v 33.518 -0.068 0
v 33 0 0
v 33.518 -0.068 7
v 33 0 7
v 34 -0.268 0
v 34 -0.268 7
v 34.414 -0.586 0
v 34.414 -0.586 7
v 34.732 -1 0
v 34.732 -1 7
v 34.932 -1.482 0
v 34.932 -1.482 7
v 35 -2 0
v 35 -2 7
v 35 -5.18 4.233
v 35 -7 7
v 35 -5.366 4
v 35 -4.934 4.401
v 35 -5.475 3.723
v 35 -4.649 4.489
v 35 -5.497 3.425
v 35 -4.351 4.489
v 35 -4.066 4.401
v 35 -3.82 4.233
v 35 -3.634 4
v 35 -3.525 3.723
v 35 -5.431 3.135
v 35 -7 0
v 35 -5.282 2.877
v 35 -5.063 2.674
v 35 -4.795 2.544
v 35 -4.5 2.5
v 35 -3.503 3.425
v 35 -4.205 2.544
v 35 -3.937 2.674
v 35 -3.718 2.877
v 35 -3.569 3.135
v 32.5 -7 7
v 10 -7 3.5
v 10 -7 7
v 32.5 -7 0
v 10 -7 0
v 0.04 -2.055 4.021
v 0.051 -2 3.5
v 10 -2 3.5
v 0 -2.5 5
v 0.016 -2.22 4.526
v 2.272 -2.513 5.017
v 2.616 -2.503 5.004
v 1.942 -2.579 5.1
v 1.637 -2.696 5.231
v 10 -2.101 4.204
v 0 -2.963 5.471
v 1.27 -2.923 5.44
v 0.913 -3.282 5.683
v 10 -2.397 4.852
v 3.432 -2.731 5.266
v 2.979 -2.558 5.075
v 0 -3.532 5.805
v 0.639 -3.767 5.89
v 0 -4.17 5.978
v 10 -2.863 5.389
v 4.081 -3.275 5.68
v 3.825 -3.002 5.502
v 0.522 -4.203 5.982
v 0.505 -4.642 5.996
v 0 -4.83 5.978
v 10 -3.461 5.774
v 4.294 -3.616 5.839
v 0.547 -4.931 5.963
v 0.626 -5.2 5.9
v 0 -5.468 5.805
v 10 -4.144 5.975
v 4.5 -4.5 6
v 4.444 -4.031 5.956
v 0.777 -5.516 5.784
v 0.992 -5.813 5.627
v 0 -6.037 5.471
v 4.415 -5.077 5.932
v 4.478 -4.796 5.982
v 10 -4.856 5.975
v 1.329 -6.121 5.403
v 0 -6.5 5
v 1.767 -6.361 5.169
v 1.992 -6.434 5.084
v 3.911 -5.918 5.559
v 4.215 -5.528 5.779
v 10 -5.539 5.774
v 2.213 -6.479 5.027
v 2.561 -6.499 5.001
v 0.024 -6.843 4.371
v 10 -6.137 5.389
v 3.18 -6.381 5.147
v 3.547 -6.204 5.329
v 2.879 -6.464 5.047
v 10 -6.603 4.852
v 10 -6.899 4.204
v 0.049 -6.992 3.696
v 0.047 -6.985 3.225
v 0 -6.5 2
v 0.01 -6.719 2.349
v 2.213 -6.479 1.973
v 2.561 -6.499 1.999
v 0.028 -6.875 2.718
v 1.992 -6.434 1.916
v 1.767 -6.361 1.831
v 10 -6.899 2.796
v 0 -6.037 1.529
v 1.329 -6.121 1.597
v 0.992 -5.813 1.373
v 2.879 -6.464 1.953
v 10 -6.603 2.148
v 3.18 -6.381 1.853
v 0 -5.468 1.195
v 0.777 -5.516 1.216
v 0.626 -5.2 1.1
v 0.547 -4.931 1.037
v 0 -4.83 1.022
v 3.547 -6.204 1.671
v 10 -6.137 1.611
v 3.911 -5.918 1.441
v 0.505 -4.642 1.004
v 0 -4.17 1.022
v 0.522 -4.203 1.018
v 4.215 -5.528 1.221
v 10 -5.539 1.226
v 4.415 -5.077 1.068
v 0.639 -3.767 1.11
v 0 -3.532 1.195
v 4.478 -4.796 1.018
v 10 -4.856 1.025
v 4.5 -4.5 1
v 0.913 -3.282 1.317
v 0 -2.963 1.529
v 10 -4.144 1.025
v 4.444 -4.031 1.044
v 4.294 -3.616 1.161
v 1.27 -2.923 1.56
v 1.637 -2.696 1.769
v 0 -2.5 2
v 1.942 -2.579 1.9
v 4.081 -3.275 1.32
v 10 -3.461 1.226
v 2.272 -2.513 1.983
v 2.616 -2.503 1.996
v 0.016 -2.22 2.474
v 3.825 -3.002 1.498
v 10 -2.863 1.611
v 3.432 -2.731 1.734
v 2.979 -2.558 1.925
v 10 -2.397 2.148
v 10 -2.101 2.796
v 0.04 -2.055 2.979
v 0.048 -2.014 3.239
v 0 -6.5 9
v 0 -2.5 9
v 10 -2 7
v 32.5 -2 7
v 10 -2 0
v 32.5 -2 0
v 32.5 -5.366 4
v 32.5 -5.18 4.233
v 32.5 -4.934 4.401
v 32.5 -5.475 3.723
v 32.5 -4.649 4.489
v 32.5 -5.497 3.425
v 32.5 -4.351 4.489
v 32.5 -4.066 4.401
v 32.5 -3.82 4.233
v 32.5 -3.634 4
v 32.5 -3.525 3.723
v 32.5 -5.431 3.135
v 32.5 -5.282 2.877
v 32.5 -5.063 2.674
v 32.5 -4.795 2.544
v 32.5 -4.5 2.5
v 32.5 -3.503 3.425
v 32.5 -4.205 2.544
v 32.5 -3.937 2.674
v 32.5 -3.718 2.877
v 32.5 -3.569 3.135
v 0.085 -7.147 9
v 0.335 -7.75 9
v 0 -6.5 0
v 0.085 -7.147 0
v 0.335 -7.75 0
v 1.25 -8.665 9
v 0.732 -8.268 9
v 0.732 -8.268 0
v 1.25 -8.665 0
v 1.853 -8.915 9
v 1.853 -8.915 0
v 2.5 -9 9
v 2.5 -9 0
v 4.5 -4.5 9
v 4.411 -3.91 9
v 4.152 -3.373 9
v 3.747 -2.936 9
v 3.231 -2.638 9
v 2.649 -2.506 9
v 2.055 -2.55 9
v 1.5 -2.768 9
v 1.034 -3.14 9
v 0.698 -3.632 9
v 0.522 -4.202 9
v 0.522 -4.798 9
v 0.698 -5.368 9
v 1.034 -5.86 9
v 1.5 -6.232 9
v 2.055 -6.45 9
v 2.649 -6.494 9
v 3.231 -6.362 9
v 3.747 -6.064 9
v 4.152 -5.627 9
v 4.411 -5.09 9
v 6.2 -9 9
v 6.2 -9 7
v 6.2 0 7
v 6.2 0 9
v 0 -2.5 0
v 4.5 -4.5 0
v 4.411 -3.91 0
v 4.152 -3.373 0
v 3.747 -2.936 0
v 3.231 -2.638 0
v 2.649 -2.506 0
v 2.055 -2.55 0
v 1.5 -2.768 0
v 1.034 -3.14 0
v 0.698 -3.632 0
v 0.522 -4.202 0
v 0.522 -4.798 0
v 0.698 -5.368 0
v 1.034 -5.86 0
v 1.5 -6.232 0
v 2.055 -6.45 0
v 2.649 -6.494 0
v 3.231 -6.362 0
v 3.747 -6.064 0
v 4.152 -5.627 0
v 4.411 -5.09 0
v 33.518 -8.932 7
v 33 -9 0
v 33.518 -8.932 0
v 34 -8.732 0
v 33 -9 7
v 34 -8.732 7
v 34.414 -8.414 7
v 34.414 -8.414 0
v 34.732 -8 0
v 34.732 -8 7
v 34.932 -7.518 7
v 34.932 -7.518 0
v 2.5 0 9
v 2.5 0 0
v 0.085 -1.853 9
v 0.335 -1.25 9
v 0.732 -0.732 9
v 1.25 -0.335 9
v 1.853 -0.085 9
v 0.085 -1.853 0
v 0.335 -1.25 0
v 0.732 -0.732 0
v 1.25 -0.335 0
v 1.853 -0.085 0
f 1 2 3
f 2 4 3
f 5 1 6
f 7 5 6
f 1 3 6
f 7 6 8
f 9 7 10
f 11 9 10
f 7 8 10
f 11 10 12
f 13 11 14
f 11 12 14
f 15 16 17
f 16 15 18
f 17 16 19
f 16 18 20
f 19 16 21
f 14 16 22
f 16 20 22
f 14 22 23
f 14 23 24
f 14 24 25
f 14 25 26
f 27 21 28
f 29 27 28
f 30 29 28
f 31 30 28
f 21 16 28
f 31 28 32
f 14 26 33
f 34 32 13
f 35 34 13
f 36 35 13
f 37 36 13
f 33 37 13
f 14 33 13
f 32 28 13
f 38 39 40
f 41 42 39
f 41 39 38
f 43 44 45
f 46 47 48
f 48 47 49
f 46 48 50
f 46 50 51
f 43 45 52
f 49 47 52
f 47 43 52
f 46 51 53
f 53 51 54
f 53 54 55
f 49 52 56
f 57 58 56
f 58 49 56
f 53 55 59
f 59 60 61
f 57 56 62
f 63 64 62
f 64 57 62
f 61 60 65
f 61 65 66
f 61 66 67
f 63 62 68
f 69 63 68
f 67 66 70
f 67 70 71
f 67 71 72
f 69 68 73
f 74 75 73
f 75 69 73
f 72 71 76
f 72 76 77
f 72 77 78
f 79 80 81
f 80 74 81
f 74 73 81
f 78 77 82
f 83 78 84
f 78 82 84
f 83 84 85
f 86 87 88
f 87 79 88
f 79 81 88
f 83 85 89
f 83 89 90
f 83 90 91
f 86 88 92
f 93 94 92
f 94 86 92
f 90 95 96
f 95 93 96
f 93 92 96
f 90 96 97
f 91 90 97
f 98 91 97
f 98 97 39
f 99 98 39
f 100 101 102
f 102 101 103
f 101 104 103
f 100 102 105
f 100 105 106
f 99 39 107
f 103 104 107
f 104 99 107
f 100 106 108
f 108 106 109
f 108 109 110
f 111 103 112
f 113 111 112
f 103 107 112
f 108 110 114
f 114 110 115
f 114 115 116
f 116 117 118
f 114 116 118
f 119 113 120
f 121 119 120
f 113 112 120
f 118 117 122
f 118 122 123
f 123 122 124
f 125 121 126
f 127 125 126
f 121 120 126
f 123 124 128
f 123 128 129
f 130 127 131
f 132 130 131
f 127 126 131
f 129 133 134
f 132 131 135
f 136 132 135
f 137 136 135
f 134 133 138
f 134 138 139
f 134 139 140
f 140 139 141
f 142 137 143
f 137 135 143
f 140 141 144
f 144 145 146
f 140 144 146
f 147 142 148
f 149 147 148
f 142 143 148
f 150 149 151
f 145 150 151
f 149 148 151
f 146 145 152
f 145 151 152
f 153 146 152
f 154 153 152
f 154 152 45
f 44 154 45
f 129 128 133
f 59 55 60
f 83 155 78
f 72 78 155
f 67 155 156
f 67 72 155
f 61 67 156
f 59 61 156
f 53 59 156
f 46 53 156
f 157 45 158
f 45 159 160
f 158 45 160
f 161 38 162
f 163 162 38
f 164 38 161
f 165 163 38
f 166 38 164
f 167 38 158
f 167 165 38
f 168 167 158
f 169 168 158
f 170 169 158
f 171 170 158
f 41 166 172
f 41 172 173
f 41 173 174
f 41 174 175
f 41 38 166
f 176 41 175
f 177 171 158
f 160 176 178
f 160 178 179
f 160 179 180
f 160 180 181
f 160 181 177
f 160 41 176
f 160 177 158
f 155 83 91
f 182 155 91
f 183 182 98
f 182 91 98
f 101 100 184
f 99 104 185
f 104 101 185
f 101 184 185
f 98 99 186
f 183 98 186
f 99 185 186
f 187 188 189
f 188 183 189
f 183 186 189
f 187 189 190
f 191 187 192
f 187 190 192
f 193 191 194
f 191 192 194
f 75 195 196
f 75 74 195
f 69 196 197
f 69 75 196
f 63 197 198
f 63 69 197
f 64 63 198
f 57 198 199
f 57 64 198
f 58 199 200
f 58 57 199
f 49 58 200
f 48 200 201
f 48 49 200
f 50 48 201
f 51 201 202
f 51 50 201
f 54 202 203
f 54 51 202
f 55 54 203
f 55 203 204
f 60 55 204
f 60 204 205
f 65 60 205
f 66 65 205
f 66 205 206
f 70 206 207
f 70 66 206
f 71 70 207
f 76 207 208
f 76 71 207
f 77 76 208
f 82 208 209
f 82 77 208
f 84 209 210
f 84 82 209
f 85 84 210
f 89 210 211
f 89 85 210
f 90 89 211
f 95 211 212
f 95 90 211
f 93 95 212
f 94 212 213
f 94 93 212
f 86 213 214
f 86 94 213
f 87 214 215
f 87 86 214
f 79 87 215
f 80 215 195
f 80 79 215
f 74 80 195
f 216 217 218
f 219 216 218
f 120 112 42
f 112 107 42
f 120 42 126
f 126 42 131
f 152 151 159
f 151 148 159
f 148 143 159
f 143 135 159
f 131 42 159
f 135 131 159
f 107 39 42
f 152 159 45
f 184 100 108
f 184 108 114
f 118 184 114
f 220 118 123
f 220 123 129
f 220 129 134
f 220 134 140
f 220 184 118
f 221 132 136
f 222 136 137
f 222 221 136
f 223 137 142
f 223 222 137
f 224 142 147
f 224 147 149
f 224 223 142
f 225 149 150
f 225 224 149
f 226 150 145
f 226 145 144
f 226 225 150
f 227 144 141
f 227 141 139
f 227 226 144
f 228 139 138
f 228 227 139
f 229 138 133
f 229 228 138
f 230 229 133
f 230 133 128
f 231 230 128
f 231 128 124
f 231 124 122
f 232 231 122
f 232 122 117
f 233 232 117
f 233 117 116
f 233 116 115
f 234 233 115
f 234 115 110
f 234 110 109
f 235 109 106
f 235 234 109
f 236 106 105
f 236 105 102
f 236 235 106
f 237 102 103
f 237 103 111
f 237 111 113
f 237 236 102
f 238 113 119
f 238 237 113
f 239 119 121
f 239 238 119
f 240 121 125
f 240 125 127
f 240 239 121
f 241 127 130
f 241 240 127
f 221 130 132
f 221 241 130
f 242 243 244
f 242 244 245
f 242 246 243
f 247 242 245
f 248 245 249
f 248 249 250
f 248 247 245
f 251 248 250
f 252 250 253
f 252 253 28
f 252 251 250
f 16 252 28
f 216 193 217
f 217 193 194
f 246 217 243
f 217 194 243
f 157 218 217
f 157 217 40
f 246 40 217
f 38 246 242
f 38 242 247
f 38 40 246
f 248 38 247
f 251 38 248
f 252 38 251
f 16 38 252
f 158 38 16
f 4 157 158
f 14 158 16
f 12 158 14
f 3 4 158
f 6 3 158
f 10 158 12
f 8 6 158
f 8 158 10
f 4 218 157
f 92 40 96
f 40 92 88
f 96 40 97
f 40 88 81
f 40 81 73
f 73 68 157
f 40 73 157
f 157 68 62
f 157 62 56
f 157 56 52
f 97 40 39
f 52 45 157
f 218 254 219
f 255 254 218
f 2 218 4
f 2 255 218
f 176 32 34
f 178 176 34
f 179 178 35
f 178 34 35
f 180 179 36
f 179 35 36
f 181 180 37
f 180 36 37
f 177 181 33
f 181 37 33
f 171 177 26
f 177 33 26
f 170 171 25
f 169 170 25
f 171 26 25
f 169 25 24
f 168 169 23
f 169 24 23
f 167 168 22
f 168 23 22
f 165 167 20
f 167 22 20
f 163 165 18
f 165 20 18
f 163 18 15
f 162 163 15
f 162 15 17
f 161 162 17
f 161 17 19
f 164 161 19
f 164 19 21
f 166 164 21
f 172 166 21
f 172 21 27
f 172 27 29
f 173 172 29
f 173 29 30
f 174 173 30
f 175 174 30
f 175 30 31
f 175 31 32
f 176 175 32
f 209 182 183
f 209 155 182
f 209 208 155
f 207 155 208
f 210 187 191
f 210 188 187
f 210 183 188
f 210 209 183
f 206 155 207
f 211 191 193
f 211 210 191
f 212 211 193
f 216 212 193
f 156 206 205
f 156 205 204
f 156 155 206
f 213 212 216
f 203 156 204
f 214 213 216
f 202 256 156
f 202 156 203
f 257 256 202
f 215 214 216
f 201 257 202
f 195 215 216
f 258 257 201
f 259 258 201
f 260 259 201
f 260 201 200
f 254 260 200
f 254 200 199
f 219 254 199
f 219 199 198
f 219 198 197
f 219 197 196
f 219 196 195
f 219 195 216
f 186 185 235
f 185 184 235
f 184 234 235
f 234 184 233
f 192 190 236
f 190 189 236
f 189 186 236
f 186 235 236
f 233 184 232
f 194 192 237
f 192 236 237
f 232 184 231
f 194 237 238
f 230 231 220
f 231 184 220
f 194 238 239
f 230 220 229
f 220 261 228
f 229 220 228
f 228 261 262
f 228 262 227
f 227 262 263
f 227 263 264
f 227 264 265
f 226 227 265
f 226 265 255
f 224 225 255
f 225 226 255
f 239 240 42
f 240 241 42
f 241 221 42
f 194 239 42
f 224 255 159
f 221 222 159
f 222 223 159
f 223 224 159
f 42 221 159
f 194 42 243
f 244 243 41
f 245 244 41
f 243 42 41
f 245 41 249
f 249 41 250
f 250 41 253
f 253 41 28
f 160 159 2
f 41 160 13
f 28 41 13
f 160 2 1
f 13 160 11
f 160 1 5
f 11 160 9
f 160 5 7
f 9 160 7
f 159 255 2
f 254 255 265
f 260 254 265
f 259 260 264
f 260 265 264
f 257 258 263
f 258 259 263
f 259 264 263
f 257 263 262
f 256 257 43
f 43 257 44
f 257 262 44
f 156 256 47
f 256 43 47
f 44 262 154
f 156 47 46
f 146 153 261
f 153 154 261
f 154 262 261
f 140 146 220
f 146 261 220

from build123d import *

# Parameters (mm, degrees)
SKETCH_1_W          = 35
SKETCH_1_H          = 9
SKETCH_1_R          = 2
SKETCH_1_W_2        = 22.5
SKETCH_1_H_2        = 5
EXTRUDE_1_DEPTH     = 7
SKETCH_2_W          = 6.2
SKETCH_2_H          = 9
SKETCH_2_R          = 2
EXTRUDE_2_DEPTH     = 4.5
CUT_EXTRUDE_2_REACH = 39.924
SKETCH_3_R          = 1
CUT_EXTRUDE_4_REACH = 30.953
SKETCH_5_R          = 2.5
FILLET_1_R          = 2
SKETCH_10_W         = 6.2
SKETCH_10_H         = 9
CUT_EXTRUDE_7_DEPTH = 2.5
FILLET_3_R          = 2.5


with BuildPart() as part:
    # 草图1 → 凸台-拉伸1 (new body)
    with BuildSketch(Plane.XY):
        with Locations((17.5, -4.5)):
            Rectangle(SKETCH_1_W, SKETCH_1_H)
        with Locations((2.5, -4.5)):
            Circle(SKETCH_1_R, mode=Mode.SUBTRACT)
        with Locations((21.25, -4.5)):
            Rectangle(SKETCH_1_W_2, SKETCH_1_H_2, mode=Mode.SUBTRACT)
    extrude(amount=EXTRUDE_1_DEPTH)

    # 草图2 → 凸台-拉伸2 (add)
    with BuildSketch(Plane.XY.offset(7)):
        with Locations((3.1, -4.5)):
            Rectangle(SKETCH_2_W, SKETCH_2_H)
        with Locations((2.5, -4.5)):
            Circle(SKETCH_2_R, mode=Mode.SUBTRACT)
    extrude(amount=EXTRUDE_2_DEPTH)

    # 草图3 → 切除-拉伸2 (cut, up to next)
    with BuildSketch(Plane(origin=(35, 0, 0), x_dir=(0, 0, -1), z_dir=(1, 0, 0)), mode=Mode.PRIVATE) as cut_extrude_2_sk1:
        with Locations((-3.5, -4.5)):
            Circle(SKETCH_3_R)
    cut_extrude_2_tool1 = extrude(cut_extrude_2_sk1.sketch, amount=-CUT_EXTRUDE_2_REACH, mode=Mode.PRIVATE) & part.part
    add(cut_extrude_2_tool1.solids().sort_by_distance((35, -4.5, 3.5))[0], mode=Mode.SUBTRACT)

    # 草图5 → 切除-拉伸4 (cut, up to next)
    with BuildSketch(Plane(origin=(10, 0, 0), x_dir=(0, 0, -1), z_dir=(1, 0, 0)), mode=Mode.PRIVATE) as cut_extrude_4_sk1:
        with Locations(Location((-3.5, -4.5, 0), (0, 0, 90))):
            Circle(SKETCH_5_R)
    cut_extrude_4_tool1 = extrude(cut_extrude_4_sk1.sketch, amount=-CUT_EXTRUDE_4_REACH, mode=Mode.PRIVATE) & part.part
    add(cut_extrude_4_tool1.solids().sort_by_distance((10, -4.5, 3.5))[0], mode=Mode.SUBTRACT)

    # 圆角1
    fillet_1_edges = [part.edges().sort_by_distance(p)[0] for p in [
        (35, -9, 3.5),
        (35, 0, 3.5),
    ]]
    fillet(fillet_1_edges, radius=FILLET_1_R)

    # 草图10 → 切除-拉伸7 (cut)
    with BuildSketch(Plane.XY.offset(11.5)):
        with Locations((3.1, -4.5)):
            Rectangle(SKETCH_10_W, SKETCH_10_H)
    extrude(amount=-CUT_EXTRUDE_7_DEPTH, mode=Mode.SUBTRACT)

    # 圆角3
    # the kernel refuses this fillet: 2.5 mm, written as the material it takes off along each edge
    with BuildSketch(Plane(origin=(0, 0, -6.25), x_dir=(1, 0, 0), z_dir=(0, 0, 1)), Plane(origin=(0, -9, -6.25), x_dir=(0, 1, 0), z_dir=(0, 0, 1))) as fillet_3_piece_1:
        with BuildLine():
            CenterArc((FILLET_3_R, -FILLET_3_R), FILLET_3_R, 90, 90)
            Line((0, -FILLET_3_R), (0, 0))
            Line((0, 0), (FILLET_3_R, 0))
        make_face()
    extrude(amount=21.5, mode=Mode.SUBTRACT)


solid = part.part
